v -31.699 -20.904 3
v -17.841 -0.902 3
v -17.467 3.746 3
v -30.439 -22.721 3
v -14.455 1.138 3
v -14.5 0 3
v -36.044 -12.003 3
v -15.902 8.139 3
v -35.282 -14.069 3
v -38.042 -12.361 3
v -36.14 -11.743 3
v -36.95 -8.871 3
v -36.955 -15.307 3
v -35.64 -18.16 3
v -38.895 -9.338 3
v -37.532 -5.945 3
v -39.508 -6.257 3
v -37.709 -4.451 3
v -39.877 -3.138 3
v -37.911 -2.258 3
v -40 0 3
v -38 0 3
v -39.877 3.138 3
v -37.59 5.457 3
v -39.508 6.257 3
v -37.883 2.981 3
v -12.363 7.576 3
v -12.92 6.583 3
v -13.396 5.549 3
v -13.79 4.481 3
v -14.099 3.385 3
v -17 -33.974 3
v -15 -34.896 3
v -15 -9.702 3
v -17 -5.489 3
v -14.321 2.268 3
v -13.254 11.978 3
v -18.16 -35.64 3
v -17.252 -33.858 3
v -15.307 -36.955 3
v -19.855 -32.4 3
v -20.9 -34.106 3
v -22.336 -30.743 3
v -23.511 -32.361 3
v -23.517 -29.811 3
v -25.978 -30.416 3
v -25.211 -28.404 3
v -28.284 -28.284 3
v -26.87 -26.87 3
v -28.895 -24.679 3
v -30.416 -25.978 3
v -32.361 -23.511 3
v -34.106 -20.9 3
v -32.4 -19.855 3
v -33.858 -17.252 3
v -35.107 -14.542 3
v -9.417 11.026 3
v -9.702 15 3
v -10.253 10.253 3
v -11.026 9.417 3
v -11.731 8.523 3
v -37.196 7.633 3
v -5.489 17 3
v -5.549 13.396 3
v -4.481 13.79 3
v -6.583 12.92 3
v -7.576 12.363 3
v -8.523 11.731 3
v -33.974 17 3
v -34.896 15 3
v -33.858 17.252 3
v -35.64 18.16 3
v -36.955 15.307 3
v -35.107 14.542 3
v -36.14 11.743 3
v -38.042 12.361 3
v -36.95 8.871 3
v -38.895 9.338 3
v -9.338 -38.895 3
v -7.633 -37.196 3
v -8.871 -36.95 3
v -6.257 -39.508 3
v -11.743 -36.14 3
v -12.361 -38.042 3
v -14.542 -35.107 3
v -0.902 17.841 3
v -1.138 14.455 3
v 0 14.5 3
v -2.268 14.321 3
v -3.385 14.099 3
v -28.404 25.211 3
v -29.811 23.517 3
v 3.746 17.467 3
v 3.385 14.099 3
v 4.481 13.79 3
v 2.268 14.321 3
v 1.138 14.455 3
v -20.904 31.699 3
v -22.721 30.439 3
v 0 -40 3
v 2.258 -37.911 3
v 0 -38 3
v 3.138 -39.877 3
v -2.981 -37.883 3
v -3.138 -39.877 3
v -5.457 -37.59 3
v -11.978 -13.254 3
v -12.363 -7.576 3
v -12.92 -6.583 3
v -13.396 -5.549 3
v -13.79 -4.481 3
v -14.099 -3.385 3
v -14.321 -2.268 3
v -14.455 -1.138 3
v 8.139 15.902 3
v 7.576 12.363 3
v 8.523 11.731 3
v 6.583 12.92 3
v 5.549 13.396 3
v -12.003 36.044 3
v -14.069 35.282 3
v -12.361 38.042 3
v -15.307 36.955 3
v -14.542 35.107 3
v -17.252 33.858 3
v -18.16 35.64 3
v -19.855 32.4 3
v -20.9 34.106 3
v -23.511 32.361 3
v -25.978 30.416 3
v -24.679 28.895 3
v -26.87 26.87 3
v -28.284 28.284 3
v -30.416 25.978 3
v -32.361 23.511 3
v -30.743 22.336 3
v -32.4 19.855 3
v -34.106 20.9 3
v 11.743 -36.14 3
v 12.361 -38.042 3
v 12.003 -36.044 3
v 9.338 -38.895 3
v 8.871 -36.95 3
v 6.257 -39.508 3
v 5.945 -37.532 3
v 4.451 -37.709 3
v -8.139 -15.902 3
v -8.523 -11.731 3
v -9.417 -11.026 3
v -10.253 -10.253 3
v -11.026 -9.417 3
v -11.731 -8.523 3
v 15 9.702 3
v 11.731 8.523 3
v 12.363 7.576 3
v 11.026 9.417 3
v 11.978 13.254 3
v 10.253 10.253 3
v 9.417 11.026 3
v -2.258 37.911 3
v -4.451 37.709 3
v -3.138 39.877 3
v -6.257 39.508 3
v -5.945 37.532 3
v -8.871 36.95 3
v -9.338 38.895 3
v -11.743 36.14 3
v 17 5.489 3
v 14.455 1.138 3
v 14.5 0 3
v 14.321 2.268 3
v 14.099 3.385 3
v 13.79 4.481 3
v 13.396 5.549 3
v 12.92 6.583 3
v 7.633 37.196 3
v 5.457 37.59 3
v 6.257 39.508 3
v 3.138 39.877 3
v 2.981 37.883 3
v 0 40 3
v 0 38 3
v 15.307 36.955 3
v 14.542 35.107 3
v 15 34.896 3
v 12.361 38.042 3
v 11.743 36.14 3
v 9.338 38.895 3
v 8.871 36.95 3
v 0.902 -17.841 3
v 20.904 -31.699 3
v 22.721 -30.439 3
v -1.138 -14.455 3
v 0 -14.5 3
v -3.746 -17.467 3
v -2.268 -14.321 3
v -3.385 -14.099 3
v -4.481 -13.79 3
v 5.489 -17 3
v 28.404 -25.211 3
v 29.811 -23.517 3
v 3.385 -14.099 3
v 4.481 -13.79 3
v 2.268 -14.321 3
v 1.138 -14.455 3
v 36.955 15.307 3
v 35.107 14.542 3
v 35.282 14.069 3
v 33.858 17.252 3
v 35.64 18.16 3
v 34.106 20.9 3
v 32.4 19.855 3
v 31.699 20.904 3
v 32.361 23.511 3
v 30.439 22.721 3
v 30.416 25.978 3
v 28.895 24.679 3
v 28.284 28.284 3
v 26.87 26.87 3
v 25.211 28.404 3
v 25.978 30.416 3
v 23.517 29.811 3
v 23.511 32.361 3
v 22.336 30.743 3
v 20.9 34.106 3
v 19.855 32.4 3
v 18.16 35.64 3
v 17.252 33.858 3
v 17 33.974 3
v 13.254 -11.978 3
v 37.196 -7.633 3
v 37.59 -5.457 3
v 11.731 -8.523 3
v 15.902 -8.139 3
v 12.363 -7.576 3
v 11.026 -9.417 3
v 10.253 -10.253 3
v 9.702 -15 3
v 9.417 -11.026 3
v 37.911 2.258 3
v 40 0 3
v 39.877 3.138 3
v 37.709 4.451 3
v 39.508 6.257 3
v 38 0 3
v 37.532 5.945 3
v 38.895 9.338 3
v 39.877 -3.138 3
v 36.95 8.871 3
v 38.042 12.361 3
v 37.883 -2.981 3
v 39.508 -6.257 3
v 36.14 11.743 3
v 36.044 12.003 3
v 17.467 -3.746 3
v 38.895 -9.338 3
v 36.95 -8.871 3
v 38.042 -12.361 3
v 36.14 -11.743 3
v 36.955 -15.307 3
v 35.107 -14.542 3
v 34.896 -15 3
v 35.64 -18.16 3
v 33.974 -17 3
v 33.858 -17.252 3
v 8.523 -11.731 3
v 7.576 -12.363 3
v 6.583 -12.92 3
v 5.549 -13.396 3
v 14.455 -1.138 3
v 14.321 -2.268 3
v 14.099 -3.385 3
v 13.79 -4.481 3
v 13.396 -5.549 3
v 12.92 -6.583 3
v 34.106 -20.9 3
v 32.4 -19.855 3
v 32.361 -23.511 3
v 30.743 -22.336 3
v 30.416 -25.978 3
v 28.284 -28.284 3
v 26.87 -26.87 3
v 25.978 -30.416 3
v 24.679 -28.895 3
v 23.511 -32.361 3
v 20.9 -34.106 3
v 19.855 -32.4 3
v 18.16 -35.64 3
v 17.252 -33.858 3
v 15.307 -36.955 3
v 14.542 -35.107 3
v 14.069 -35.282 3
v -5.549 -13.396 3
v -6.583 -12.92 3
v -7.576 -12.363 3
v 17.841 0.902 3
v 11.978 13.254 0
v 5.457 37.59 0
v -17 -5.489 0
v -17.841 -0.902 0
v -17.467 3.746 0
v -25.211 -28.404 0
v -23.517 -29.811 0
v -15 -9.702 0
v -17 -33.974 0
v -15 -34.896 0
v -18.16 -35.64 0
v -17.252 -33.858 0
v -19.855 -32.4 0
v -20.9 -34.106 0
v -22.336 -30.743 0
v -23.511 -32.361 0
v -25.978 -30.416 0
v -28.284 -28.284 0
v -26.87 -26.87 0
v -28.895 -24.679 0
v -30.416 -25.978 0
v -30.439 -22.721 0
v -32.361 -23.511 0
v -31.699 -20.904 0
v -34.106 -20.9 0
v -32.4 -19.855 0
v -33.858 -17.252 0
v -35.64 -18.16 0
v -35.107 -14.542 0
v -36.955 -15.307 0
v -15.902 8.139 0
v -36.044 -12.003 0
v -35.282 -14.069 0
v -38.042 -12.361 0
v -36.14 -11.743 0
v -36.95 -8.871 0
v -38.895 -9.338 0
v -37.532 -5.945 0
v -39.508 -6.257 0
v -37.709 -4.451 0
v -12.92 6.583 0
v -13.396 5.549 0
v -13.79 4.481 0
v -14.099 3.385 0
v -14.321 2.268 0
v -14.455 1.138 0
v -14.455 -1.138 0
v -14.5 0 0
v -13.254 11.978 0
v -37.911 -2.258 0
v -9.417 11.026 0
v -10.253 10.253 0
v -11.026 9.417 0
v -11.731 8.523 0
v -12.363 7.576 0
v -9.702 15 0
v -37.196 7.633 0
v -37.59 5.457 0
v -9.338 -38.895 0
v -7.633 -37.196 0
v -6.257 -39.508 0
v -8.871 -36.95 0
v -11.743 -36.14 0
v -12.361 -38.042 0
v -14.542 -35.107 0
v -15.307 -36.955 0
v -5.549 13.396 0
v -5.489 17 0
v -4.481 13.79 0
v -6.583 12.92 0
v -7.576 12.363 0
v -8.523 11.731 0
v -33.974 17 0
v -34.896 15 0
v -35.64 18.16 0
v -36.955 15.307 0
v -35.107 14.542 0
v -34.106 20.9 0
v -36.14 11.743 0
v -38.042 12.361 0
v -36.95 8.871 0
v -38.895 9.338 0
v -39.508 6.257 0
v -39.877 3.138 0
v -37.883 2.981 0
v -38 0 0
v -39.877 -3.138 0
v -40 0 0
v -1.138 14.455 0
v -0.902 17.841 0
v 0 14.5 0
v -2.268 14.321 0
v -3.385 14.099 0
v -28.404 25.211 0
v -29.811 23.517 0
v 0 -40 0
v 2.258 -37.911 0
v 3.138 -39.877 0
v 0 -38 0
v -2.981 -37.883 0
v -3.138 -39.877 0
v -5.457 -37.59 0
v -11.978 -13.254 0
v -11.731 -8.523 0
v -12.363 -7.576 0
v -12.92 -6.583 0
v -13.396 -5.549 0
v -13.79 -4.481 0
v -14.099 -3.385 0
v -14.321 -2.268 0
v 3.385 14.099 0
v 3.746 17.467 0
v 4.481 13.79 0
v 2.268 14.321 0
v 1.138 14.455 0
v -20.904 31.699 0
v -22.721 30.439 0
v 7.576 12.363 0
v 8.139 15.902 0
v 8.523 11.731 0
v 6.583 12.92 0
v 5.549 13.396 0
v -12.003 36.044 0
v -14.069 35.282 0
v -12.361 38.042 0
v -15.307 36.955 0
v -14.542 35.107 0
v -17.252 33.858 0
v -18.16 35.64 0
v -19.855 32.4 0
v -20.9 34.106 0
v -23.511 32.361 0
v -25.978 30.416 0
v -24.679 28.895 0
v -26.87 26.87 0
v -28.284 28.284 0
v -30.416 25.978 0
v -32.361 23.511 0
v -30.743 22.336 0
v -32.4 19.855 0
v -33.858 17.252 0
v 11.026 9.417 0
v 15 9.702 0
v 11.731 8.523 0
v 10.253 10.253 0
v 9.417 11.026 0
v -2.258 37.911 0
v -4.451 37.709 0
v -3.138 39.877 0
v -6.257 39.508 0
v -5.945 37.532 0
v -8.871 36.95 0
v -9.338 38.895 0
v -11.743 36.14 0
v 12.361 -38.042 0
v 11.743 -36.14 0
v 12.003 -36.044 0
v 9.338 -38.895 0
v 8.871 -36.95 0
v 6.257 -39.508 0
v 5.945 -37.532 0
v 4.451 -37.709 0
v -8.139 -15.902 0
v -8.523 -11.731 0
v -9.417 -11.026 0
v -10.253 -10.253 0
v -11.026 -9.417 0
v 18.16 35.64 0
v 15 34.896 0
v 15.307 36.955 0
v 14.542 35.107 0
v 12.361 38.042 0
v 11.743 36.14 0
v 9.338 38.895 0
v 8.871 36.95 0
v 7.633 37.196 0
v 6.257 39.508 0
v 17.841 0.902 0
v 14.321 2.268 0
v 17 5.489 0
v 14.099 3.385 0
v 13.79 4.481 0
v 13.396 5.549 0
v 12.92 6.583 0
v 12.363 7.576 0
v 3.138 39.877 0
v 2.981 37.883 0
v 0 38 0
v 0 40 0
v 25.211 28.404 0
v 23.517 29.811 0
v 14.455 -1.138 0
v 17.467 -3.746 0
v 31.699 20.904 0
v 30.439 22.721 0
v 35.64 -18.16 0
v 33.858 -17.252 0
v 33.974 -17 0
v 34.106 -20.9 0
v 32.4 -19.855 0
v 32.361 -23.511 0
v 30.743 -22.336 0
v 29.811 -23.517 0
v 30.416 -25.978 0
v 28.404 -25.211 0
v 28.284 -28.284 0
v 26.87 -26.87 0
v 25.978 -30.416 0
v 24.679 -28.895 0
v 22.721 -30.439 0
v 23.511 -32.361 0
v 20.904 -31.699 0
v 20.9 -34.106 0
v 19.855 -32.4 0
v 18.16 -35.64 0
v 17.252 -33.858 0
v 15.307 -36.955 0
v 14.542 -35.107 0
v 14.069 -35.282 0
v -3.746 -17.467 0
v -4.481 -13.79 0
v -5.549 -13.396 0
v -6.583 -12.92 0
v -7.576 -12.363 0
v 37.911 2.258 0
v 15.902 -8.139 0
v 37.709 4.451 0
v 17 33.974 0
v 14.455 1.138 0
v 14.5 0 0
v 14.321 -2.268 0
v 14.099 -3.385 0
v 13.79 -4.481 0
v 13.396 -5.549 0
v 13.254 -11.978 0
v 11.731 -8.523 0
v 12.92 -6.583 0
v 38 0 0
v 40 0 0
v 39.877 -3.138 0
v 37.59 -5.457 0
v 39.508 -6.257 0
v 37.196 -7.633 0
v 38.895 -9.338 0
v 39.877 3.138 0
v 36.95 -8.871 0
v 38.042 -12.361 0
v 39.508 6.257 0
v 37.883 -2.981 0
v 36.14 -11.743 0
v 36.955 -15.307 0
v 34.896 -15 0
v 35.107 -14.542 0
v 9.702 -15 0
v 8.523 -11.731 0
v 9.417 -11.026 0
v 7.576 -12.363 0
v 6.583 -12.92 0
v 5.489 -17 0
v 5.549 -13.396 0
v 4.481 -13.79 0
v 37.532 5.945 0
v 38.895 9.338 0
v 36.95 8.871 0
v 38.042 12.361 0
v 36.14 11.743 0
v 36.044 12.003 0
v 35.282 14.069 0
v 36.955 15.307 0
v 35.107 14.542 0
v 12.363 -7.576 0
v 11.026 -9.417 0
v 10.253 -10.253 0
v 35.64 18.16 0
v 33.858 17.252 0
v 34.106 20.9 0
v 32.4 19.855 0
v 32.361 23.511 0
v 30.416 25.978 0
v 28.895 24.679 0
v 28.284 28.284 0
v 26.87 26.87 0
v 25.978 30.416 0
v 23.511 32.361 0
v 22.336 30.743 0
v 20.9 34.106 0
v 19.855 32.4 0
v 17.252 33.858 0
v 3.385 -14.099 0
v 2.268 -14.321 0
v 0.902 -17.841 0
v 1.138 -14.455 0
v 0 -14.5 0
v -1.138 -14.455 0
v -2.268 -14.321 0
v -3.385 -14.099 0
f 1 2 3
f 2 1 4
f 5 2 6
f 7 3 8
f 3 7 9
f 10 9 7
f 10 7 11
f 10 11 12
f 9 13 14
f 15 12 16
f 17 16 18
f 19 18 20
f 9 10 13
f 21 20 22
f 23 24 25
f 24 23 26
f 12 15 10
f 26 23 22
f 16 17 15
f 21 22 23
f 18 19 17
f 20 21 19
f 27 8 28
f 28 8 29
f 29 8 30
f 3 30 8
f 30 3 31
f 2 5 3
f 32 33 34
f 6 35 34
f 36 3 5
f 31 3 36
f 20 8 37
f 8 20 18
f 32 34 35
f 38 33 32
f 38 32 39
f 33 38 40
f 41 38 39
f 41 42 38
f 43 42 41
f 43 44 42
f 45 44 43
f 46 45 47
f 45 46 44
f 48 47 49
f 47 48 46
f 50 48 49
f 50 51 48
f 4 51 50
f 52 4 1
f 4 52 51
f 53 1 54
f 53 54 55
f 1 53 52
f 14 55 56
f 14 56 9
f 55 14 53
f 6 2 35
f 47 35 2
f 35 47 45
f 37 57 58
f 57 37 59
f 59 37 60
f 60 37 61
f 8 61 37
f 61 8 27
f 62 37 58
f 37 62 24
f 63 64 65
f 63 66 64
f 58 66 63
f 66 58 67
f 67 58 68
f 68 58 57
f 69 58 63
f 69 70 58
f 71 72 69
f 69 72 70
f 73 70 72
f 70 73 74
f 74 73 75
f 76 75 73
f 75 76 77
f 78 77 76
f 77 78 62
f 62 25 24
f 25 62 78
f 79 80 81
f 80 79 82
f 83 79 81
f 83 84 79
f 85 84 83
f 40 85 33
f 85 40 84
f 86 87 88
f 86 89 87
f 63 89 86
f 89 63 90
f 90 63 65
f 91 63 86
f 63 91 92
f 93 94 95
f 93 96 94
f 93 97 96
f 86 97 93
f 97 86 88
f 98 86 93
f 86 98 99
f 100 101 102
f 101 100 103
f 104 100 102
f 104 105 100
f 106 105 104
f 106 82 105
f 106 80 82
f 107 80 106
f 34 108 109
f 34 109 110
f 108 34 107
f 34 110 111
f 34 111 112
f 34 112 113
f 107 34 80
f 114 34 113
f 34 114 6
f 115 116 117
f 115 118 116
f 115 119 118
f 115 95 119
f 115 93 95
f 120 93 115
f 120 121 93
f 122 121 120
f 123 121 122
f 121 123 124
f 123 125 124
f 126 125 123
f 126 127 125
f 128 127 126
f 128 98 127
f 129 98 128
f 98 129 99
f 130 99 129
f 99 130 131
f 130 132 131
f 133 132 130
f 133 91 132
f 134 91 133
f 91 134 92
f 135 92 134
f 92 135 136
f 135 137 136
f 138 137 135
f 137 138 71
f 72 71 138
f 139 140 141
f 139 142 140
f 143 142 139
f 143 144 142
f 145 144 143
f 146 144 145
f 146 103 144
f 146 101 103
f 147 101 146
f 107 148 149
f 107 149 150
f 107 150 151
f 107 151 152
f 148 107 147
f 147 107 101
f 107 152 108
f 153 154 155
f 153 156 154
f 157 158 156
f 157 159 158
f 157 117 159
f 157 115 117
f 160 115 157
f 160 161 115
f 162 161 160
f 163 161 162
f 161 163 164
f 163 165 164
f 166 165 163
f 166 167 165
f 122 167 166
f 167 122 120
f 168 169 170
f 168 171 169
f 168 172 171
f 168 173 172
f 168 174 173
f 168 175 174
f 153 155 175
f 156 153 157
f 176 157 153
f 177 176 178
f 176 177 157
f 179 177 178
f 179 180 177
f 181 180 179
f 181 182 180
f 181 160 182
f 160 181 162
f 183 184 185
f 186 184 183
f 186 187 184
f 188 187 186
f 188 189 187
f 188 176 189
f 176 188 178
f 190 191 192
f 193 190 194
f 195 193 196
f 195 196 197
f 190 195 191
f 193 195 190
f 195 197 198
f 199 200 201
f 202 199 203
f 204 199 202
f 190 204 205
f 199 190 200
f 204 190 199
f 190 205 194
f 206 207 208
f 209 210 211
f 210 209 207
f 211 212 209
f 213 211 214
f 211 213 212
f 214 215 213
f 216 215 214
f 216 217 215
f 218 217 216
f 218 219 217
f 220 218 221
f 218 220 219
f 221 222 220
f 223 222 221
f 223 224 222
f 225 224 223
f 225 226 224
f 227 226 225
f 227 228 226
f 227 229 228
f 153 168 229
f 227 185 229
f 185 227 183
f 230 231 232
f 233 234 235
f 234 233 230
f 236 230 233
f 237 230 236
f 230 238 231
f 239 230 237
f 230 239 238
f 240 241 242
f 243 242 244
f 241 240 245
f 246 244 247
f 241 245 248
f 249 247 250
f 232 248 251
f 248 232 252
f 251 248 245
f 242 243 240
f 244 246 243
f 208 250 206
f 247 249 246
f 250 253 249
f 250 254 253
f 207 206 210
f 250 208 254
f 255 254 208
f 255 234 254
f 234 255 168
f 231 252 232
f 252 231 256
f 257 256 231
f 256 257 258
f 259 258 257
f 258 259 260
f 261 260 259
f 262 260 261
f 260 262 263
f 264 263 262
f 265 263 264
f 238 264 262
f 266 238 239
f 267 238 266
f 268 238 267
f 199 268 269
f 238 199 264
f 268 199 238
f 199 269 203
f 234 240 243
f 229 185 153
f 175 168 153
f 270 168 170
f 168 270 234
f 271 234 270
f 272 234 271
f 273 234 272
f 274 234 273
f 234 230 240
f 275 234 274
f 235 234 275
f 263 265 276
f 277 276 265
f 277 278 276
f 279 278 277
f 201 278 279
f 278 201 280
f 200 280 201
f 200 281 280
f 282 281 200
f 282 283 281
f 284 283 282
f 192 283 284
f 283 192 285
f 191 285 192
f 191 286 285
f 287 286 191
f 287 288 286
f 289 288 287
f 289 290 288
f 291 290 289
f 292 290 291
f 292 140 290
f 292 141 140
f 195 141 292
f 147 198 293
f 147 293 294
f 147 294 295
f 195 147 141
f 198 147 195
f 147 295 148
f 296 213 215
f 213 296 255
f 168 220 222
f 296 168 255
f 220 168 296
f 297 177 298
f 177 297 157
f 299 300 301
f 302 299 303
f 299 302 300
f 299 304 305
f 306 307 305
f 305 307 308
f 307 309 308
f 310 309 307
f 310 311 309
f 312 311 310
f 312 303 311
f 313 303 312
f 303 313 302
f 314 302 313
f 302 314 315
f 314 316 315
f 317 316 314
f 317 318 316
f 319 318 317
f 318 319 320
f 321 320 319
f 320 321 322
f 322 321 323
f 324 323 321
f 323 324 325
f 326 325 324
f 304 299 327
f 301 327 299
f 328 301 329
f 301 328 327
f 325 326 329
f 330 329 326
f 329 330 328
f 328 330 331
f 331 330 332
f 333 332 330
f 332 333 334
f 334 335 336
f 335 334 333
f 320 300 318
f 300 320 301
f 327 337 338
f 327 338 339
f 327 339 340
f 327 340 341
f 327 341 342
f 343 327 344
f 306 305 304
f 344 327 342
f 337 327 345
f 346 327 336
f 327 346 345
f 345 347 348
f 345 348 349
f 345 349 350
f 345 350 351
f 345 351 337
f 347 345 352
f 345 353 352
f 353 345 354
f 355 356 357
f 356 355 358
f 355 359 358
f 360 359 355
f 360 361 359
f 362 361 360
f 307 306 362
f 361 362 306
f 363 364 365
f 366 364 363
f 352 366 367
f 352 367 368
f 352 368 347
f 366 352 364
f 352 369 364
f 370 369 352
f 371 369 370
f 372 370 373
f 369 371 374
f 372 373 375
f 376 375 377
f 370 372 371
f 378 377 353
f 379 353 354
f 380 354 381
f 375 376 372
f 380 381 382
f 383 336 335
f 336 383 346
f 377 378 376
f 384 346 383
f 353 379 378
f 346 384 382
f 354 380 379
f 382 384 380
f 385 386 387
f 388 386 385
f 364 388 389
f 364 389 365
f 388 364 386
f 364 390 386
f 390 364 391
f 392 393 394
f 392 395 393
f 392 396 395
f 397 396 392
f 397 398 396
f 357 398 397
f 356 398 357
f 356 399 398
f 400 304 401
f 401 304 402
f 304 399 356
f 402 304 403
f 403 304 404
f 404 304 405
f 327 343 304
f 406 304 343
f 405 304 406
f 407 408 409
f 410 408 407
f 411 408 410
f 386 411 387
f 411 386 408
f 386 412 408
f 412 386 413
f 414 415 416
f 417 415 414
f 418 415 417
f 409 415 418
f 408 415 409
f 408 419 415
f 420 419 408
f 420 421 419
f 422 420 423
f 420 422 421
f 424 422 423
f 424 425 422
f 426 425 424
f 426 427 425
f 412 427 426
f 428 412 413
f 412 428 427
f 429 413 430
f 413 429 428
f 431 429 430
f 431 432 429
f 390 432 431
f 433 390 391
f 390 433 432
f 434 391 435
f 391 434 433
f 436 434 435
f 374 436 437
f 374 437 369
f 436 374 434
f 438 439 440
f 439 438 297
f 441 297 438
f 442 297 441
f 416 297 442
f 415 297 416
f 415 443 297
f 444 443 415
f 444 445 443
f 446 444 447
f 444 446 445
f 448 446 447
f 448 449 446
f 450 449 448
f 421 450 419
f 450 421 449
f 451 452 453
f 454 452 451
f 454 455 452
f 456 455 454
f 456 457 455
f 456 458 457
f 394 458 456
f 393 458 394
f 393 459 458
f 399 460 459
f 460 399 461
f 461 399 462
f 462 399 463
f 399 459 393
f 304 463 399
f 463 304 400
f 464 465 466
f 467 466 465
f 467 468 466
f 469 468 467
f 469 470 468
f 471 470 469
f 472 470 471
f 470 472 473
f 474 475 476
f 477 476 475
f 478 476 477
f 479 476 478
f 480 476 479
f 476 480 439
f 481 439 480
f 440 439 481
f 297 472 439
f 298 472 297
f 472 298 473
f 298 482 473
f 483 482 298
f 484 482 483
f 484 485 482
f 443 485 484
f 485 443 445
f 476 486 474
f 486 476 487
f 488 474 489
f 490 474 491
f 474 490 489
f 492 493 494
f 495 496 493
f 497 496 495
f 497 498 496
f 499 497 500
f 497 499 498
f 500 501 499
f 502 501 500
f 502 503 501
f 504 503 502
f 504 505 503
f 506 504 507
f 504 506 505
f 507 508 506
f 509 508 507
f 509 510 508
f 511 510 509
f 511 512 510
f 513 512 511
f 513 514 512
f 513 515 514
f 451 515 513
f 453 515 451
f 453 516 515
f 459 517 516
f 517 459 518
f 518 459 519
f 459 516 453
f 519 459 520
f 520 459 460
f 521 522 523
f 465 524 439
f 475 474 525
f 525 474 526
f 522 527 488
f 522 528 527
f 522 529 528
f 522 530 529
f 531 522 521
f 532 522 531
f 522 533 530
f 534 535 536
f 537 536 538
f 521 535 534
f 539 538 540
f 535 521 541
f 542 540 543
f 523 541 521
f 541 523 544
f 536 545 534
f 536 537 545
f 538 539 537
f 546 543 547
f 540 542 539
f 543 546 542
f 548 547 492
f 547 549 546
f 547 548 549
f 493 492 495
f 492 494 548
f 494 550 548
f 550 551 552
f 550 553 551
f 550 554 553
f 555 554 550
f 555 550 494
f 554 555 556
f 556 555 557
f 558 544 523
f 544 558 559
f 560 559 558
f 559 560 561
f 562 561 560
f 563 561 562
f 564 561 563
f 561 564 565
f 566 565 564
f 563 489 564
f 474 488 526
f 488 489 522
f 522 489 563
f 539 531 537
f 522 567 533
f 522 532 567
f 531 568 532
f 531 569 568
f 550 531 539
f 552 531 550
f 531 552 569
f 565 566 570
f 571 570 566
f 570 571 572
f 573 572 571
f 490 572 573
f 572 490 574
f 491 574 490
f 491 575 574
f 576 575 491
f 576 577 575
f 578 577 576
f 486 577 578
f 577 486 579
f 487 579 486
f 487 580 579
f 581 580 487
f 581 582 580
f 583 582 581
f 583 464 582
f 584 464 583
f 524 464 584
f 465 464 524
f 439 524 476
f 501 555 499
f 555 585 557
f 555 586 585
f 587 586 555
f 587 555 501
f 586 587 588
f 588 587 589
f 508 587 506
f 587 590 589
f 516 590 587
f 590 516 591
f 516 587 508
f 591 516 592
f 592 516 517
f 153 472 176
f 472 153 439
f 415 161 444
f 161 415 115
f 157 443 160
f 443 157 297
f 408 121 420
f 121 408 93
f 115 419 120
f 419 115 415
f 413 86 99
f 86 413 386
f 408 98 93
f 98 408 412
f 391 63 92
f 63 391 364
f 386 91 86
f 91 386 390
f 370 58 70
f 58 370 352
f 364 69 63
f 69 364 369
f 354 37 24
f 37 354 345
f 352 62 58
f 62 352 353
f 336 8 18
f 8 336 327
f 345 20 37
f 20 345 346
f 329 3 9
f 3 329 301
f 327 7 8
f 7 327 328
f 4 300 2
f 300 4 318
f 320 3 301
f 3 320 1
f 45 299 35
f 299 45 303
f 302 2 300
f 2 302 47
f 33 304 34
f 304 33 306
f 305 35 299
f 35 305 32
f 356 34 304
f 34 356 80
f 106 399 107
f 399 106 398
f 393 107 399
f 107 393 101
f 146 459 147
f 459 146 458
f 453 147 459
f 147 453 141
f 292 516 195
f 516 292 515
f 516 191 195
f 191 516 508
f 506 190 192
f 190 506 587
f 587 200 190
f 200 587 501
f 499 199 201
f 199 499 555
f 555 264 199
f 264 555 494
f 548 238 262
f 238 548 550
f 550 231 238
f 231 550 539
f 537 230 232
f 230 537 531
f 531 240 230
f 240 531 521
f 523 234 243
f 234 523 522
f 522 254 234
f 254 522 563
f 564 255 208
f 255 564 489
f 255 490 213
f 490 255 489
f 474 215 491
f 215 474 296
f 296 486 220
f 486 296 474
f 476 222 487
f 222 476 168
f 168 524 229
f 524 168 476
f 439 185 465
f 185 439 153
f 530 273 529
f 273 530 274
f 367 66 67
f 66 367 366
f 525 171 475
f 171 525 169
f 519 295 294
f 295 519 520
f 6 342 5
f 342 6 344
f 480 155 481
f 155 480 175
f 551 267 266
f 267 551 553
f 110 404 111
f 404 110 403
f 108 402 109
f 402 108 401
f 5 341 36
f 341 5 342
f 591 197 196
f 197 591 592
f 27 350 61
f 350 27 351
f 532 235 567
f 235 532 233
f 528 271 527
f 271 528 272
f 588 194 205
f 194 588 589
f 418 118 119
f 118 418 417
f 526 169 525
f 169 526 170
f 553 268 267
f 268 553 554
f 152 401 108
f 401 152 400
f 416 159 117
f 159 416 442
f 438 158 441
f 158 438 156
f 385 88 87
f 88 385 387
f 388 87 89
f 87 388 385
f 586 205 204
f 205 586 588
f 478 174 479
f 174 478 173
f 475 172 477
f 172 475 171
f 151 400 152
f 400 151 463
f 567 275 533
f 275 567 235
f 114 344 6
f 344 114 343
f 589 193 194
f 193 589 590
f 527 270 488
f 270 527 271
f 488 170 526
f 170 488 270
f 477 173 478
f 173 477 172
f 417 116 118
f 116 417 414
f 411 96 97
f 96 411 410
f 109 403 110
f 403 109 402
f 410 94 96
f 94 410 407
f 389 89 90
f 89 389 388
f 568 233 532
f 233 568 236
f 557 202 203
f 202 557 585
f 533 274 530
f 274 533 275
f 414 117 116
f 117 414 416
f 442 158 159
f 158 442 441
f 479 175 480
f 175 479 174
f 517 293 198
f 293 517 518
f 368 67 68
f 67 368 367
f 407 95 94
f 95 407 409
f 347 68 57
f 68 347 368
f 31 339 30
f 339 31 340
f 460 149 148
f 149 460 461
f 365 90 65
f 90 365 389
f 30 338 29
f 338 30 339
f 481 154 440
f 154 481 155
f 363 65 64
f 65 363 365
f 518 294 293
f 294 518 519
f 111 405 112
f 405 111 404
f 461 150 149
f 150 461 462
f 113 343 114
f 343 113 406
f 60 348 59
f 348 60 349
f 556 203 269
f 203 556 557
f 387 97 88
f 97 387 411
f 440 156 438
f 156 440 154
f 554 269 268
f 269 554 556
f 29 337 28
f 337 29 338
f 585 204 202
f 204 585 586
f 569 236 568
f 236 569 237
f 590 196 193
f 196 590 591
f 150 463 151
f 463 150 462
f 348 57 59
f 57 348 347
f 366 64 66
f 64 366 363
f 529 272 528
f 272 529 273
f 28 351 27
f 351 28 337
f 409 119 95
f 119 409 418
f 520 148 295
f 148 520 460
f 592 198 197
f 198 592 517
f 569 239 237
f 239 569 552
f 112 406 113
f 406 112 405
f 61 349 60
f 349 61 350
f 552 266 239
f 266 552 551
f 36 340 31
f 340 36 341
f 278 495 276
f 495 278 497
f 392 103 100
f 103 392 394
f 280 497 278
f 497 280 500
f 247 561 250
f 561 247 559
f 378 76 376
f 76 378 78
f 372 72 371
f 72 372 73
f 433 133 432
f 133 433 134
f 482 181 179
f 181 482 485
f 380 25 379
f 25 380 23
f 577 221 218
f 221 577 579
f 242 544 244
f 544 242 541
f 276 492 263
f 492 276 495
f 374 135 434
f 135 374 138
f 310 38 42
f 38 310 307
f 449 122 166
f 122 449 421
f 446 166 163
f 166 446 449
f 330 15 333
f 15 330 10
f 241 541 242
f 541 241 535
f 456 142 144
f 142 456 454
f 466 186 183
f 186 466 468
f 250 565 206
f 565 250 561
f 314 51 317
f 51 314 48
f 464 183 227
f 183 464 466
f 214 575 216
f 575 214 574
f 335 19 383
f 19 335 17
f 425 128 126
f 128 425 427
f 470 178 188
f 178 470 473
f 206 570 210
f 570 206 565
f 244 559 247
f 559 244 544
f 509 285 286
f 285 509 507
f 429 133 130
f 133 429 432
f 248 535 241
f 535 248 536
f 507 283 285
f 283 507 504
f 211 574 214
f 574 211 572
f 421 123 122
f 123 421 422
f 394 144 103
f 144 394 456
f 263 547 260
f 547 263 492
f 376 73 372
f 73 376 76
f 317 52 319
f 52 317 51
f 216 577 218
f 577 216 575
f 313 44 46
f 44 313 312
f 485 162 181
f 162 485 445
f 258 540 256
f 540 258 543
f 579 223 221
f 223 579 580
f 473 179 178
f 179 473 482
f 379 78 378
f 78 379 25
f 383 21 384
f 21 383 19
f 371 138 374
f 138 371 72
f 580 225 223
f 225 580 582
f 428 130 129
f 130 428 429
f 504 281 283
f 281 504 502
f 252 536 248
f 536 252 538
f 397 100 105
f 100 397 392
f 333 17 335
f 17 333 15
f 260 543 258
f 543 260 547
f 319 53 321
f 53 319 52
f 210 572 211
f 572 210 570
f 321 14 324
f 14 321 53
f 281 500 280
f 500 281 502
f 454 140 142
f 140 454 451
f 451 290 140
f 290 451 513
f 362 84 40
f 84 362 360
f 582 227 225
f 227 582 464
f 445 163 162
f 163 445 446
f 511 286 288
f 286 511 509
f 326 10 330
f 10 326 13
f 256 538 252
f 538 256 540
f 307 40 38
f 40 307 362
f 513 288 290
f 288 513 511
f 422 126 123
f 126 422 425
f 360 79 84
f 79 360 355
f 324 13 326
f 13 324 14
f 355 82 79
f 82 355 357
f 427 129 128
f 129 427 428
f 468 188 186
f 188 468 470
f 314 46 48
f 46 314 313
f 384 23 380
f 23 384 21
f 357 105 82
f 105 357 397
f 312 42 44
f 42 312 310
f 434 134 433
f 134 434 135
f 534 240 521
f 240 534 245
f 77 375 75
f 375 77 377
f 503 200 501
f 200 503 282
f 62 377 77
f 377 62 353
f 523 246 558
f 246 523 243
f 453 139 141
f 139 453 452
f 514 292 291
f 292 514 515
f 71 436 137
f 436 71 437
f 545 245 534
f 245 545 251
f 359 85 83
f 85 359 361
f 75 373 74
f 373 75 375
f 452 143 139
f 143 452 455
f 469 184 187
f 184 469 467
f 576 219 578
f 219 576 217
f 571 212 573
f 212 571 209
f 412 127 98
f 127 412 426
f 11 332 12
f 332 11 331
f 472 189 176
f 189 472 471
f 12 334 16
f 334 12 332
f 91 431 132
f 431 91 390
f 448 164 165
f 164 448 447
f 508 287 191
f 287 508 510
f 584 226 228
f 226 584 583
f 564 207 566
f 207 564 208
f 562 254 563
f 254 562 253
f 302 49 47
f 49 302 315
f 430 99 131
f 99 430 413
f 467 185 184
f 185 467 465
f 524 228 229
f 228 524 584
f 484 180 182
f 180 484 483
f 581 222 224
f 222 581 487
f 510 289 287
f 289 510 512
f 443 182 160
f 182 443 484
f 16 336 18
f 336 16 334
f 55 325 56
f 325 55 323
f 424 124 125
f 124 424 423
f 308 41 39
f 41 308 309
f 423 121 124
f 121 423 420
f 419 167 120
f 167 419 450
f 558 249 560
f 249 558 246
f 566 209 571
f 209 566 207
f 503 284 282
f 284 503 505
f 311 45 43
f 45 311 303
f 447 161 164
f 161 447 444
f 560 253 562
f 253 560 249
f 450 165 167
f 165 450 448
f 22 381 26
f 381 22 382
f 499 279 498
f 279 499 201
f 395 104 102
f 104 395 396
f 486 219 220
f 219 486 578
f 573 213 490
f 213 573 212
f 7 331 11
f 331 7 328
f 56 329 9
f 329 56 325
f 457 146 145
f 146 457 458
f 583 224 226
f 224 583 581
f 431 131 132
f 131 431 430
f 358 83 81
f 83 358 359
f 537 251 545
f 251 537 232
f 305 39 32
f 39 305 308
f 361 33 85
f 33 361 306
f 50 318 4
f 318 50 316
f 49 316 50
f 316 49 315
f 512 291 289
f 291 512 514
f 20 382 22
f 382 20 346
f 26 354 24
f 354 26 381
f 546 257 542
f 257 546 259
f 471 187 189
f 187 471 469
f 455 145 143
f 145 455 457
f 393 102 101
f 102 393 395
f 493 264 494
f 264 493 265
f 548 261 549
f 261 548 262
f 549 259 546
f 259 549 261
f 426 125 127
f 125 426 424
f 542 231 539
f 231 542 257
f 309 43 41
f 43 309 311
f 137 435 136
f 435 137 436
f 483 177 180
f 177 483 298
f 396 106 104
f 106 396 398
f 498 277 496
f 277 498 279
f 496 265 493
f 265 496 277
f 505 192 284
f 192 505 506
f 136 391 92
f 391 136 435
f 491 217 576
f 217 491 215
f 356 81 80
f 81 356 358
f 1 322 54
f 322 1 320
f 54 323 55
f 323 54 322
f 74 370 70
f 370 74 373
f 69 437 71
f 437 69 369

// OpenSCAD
$fn=80;

module outerRing() {
    difference() {
        cylinder(d=80,h=3);
        translate([0,0,-0.1]) cylinder(d=80-4,h=3+0.2);
    }
}

module innerRing() {
    difference() {
        cylinder(d=29+4,h=3);
        translate([0,0,-0.1]) cylinder(d=29,h=3+0.2);
    }
}

//for(i = [1:8]) {
//    rotate([0,0,i*45]) translate([27,0,0]) scale([0.65,0.65,1]) innerRing();
//}


for(i = [1:24]) {
    rotate([0,0,i*(360/24)]) translate([15,0,0]) cube([2,36,3]);
}

innerRing();
outerRing();
